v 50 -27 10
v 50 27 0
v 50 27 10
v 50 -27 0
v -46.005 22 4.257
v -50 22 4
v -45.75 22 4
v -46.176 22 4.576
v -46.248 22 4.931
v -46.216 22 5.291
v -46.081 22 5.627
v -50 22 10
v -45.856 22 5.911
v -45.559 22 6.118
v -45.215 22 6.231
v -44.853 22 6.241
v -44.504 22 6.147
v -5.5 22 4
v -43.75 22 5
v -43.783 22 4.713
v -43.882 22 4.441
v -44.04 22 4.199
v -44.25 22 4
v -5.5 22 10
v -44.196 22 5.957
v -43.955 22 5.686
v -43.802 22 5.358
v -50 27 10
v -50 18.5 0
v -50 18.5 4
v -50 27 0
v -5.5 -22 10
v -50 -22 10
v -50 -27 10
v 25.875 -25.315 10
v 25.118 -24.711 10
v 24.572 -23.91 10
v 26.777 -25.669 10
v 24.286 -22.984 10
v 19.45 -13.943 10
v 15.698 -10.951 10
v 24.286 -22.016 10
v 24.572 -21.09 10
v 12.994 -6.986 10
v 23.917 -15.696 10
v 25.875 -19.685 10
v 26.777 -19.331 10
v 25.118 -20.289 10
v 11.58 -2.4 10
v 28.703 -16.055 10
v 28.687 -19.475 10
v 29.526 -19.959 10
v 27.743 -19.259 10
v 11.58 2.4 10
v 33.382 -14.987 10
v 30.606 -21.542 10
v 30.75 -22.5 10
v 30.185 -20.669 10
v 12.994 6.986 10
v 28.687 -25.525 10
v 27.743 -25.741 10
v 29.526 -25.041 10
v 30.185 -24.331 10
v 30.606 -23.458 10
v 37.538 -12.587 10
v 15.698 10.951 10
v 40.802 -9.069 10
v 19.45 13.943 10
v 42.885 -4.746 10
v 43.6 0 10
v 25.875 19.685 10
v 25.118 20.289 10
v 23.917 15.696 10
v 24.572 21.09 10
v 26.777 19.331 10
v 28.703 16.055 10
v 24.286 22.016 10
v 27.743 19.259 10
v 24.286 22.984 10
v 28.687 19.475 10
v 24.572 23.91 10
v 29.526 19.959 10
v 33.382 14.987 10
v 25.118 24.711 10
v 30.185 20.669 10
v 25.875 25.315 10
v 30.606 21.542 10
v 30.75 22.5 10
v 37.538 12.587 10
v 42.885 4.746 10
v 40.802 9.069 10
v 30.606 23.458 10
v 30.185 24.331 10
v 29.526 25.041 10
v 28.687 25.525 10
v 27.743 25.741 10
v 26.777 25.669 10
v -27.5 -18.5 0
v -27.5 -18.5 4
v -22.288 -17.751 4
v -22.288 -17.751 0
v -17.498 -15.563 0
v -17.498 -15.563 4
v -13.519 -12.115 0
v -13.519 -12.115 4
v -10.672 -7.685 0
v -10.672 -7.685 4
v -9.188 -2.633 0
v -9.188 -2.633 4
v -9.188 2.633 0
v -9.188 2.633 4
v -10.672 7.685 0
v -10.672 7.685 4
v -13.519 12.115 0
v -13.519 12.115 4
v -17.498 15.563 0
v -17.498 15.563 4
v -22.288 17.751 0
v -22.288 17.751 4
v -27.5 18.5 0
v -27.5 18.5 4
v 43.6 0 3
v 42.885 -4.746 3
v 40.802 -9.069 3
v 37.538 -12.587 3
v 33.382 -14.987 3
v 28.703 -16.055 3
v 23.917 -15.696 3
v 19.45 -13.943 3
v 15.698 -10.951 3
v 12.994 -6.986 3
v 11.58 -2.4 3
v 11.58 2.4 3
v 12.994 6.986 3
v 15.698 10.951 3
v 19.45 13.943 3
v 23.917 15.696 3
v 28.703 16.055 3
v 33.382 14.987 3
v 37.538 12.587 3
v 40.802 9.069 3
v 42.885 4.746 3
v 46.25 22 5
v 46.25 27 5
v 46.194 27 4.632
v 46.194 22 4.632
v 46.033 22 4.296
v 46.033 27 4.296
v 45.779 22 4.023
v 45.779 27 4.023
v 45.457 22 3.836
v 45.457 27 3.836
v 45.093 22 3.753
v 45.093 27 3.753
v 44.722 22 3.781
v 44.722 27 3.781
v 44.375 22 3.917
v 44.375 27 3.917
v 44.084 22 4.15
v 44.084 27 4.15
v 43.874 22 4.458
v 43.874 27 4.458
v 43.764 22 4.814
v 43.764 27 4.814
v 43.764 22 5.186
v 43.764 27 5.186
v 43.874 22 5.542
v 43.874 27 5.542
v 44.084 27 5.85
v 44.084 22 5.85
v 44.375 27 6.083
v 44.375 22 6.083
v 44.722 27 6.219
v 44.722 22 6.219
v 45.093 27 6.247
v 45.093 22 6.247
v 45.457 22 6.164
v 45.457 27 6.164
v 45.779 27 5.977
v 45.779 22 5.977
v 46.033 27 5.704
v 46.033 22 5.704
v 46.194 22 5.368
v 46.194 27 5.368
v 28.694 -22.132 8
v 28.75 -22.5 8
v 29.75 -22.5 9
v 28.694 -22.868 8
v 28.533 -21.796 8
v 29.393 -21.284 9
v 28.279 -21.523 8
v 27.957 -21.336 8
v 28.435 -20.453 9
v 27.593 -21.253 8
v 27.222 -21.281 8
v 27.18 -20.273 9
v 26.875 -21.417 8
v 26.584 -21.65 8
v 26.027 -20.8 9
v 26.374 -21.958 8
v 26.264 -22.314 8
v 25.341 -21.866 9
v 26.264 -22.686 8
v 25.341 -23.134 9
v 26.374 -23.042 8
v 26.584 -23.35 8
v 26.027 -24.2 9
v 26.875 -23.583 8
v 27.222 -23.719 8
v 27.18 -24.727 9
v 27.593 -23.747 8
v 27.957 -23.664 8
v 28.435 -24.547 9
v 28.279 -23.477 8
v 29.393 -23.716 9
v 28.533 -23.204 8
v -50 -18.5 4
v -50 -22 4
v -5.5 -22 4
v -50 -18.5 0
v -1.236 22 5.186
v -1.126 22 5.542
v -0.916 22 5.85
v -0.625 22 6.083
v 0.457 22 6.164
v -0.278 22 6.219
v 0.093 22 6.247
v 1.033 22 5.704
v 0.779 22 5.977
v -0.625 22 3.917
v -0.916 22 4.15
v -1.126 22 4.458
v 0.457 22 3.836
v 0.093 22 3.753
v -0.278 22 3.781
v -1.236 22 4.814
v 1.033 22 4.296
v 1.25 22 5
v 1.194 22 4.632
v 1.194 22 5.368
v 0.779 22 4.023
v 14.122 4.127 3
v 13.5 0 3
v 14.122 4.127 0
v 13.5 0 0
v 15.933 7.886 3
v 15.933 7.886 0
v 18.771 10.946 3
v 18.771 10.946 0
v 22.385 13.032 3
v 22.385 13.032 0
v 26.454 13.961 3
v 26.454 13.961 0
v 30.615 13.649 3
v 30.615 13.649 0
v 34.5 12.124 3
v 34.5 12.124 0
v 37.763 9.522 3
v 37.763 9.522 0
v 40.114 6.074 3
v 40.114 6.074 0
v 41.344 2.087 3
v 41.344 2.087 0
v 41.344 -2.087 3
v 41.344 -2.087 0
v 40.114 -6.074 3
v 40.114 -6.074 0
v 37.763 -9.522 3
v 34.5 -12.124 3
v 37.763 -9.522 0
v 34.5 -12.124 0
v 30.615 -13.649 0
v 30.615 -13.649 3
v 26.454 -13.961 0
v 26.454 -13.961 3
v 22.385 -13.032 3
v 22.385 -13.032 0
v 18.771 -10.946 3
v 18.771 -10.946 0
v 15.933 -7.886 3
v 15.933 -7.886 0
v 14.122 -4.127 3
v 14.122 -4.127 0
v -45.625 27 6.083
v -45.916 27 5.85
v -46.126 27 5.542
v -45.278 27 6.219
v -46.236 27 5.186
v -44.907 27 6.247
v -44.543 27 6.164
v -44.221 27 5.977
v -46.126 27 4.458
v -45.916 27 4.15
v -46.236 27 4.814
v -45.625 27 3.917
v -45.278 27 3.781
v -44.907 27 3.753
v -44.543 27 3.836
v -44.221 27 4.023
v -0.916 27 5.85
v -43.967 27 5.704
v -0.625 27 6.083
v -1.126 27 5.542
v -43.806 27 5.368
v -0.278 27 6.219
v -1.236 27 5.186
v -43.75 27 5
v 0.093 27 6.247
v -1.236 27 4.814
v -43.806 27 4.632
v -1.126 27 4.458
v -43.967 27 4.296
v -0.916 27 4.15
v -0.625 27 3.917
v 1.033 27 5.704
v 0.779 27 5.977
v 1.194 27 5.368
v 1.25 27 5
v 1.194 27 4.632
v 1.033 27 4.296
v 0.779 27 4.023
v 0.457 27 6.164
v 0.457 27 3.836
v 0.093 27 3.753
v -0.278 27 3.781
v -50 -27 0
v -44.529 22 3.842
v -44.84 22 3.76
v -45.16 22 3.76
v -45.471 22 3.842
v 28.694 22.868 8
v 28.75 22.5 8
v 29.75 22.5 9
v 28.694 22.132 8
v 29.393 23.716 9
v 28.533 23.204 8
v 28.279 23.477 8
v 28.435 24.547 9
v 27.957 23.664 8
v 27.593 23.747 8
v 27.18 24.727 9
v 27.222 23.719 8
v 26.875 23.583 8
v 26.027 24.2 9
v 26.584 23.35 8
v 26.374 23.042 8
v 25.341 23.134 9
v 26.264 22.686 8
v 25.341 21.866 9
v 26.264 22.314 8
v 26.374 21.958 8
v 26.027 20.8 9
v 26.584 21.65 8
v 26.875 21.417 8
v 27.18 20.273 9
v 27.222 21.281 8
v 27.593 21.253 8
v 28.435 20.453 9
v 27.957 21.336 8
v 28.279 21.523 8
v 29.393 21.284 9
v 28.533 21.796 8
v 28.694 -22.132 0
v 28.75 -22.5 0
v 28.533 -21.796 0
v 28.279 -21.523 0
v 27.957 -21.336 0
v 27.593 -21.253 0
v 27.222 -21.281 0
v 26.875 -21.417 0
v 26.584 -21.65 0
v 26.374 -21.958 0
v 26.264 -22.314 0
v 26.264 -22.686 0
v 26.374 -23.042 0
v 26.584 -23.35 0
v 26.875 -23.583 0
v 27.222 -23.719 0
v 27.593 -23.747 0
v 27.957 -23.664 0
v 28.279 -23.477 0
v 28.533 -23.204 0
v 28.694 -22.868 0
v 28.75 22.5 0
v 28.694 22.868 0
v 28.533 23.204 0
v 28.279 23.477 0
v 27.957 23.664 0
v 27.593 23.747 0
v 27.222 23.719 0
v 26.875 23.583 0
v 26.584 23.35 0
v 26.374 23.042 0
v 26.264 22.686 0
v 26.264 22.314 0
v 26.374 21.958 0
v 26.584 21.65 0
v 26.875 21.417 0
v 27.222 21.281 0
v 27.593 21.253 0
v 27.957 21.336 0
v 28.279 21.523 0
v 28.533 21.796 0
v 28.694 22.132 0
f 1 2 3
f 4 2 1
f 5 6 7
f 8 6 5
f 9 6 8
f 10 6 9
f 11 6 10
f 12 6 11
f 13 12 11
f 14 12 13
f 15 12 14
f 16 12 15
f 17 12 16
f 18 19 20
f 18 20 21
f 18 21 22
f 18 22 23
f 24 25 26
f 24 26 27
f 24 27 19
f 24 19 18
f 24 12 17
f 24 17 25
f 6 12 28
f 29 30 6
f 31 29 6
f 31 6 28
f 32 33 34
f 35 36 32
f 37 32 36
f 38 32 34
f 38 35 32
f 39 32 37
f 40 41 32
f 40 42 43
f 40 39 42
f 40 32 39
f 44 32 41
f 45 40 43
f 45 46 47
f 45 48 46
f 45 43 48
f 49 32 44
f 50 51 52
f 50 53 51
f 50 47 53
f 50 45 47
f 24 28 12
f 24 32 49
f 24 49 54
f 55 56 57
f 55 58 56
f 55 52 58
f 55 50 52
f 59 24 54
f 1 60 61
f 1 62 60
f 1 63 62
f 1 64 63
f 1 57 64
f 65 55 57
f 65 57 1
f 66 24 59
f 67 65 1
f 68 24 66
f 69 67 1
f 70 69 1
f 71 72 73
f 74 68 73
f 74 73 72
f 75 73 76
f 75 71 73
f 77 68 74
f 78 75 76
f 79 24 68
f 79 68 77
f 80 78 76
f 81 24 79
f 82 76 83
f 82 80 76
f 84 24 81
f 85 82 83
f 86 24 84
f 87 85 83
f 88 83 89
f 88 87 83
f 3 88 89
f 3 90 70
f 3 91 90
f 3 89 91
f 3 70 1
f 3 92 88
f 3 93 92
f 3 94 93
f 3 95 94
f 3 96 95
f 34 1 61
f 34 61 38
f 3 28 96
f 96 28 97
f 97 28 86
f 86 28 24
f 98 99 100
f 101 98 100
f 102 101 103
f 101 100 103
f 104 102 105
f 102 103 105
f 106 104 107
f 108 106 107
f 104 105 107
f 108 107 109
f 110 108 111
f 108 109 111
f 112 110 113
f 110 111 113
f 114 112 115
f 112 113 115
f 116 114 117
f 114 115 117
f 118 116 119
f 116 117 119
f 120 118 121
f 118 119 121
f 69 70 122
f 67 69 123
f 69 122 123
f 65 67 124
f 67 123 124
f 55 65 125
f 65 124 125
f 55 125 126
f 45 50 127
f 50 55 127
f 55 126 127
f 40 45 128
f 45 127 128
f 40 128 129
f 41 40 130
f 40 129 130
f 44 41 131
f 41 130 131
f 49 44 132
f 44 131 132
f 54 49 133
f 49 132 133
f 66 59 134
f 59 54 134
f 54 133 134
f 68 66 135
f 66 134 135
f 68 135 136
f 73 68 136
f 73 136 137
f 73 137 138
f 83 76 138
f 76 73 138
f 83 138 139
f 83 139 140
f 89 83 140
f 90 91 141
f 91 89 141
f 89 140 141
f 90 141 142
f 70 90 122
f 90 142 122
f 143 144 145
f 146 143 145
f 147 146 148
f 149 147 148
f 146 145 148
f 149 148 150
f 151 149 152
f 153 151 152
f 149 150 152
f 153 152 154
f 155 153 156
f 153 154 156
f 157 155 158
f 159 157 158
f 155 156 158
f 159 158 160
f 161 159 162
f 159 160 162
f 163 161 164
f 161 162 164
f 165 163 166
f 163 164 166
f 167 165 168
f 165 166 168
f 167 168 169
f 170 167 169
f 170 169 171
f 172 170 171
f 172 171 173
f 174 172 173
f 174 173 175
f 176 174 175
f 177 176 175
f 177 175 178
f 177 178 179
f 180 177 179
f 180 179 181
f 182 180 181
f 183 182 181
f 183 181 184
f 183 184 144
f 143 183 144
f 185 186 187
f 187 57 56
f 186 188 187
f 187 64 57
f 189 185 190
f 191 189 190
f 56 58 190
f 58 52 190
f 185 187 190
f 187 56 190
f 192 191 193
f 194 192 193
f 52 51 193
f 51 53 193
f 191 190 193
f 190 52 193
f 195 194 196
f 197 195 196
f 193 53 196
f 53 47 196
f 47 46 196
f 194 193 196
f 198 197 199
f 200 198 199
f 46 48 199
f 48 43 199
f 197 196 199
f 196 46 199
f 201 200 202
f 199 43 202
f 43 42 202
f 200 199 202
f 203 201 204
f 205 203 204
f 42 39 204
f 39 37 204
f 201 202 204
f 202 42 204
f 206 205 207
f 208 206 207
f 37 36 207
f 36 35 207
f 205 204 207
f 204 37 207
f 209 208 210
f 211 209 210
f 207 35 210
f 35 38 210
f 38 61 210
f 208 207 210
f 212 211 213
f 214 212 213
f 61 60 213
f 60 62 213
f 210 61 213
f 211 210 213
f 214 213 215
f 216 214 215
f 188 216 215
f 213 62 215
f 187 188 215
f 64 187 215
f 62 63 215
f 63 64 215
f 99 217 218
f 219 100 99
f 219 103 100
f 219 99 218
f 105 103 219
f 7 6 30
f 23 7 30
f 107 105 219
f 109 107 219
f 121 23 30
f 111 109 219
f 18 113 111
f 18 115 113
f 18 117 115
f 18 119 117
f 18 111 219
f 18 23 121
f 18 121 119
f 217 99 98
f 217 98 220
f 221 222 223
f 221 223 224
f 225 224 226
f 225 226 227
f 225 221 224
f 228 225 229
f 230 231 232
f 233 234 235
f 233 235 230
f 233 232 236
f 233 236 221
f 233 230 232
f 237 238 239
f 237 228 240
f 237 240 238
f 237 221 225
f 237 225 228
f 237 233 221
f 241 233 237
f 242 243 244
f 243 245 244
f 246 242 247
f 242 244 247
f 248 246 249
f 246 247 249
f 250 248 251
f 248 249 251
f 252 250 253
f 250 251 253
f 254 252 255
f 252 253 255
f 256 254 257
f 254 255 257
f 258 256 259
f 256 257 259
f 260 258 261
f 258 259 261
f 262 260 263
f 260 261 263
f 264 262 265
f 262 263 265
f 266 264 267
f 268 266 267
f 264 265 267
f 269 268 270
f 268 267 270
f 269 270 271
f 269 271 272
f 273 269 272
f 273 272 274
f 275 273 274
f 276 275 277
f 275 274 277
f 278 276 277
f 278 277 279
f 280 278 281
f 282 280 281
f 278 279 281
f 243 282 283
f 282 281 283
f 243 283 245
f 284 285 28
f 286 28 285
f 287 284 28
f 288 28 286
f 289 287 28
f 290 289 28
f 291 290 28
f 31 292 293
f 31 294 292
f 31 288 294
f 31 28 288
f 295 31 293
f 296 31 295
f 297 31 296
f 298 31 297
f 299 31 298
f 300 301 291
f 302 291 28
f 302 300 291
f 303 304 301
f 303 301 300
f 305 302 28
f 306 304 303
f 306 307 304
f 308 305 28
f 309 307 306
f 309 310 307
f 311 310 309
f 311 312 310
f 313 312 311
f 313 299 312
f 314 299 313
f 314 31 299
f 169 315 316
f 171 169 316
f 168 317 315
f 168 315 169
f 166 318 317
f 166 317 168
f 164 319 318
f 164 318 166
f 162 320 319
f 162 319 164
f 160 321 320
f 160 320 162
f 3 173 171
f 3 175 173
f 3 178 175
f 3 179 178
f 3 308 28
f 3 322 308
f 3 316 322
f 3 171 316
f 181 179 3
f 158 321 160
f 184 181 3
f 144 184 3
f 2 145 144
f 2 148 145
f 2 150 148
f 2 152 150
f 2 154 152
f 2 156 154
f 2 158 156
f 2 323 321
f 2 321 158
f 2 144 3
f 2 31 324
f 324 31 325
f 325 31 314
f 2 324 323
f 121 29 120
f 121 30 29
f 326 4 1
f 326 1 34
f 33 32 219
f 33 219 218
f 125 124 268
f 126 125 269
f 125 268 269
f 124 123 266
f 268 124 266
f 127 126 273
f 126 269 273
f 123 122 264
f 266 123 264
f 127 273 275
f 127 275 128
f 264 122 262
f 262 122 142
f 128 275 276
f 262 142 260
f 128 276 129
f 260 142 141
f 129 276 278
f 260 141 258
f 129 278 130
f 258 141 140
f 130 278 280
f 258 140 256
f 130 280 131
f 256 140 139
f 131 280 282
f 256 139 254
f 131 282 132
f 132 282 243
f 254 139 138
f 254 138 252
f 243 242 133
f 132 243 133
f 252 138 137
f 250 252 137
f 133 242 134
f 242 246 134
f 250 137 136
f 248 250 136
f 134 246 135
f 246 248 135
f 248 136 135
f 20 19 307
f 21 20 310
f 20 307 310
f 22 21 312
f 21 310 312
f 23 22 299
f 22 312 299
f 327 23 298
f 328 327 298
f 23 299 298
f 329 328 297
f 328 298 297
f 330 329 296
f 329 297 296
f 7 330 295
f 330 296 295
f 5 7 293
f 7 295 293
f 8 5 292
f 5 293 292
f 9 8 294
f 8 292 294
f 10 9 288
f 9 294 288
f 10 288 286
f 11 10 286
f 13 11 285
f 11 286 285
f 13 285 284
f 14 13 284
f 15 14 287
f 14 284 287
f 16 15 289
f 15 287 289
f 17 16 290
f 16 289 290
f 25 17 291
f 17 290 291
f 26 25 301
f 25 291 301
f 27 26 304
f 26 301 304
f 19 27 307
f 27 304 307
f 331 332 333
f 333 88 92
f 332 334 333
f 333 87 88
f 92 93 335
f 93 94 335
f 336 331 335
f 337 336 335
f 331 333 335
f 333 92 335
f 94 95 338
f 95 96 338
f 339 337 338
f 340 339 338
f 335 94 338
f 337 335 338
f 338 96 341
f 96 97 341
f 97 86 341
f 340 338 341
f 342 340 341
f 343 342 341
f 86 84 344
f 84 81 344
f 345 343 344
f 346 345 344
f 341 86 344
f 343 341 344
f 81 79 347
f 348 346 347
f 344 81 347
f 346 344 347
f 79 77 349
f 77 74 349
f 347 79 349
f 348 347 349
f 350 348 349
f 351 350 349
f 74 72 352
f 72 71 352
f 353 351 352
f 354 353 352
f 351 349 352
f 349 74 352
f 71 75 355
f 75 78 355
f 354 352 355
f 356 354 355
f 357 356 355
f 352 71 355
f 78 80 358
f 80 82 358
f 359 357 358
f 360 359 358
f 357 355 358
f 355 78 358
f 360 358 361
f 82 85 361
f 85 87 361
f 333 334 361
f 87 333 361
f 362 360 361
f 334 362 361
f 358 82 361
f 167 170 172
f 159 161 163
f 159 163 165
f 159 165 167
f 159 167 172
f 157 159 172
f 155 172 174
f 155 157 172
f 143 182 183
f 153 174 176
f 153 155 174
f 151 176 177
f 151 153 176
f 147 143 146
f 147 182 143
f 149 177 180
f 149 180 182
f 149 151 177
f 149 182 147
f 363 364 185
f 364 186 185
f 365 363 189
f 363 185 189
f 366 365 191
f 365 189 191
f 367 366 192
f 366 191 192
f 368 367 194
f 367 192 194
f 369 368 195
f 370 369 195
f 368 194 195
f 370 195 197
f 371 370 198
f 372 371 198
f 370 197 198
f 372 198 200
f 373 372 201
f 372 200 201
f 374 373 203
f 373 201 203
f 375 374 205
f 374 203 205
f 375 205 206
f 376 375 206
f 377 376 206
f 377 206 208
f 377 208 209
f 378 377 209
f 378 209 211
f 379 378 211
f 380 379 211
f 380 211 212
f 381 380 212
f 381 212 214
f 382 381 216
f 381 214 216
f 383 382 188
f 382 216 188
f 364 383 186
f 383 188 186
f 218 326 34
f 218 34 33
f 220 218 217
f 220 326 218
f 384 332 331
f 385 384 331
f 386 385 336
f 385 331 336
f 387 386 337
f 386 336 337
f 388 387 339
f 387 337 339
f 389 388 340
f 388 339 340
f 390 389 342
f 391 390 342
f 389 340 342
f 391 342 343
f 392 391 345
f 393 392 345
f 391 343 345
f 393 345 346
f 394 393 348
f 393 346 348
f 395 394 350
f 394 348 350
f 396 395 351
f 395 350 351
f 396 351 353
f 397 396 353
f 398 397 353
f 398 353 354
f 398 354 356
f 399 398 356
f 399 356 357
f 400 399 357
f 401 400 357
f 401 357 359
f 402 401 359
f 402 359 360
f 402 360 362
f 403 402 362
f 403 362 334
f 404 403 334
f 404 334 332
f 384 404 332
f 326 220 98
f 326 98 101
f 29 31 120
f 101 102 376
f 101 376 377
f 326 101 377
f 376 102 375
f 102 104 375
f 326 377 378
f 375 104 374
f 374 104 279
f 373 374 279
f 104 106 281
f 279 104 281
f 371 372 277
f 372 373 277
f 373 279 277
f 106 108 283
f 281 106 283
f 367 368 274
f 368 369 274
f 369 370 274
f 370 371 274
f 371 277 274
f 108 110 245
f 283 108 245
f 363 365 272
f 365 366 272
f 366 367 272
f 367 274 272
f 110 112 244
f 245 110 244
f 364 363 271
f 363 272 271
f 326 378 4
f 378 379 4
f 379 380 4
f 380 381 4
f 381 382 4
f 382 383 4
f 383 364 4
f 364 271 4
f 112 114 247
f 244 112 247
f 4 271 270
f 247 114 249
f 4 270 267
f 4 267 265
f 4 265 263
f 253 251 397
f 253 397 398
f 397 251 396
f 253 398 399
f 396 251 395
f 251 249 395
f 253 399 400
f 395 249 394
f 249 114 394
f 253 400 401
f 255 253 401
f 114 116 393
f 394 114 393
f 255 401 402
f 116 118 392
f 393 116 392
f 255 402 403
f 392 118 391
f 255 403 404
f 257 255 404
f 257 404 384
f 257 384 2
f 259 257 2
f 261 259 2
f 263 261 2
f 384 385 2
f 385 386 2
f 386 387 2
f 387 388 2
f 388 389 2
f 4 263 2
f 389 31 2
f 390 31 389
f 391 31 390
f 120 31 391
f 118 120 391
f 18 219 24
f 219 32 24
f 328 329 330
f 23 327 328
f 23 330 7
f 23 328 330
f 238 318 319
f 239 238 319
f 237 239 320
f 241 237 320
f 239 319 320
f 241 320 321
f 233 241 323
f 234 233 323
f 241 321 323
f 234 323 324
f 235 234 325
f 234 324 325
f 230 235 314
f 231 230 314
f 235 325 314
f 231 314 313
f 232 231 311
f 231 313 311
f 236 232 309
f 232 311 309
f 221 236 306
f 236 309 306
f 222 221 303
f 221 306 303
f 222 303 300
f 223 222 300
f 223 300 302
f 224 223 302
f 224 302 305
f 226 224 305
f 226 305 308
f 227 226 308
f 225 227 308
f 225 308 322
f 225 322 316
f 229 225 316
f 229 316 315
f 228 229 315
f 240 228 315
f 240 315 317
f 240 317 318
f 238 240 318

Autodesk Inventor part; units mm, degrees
ref_plane "YZ Plane" through (0, 0, 0) normal (1, 0, 0) x (0, 1, 0)
ref_plane "XZ Plane" through (0, 0, 0) normal (0, 1, 0) x (-1, 0, 0)
ref_plane "XY Plane" through (0, 0, 0) normal (0, 0, 1) x (1, 0, 0)
sketch "Эскиз1" plane through (0, 0, 0) normal (0, 0, 1) x (1, 0, 0)
  line L0 (50, -27) -> (-50, -27)
  line L1 (-50, -27) -> (-50, 27)
  line L2 (-50, 27) -> (50, 27)
  line L3 (50, 27) -> (50, -27)
  line L4 (50, -27) -> (-50, 27) construction
  line L5 (-50, -27) -> (50, 27) construction
  circle A0 centre (27.5, 0) radius 16.1
  point P0 (0, 0)
  point P1 (0, 0)
  dimension "d0" = 100
  dimension "d1" = 54
  dimension "d2" = 32.2
  dimension "d3" = 22.5
extrude "Выдавливание1" add sketch "Эскиз1" along normal blind 10
sketch "Эскиз2" plane through (0, 0, 0) normal (0, 0, -1) x (-1, 0, 0)
  circle A0 centre (-27.5, 0) radius 16.1 projected
  circle A1 centre (-27.5, 0) radius 14
  point P0 (0, 0)
  dimension "d6" = 28
extrude "Выдавливание2" add sketch "Эскиз2" against normal blind 3
sketch "Эскиз3" plane through (0, 0, 10) normal (0, 0, 1) x (1, 0, 0)
  line L0 (-5.5, -22) -> (-5.5, 22) projected
  circle A0 centre (-27.5, 0) radius 18.5
  line L1 (-27.5, -18.5) -> (-62.6366, -18.5)
  line L2 (-62.6366, -18.5) -> (-62.6366, 18.5)
  line L3 (-62.6366, 18.5) -> (-27.5, 18.5)
  point P0 (0, 0)
  dimension "d9" = 37
  dimension "d10" = 22
extrude "Выдавливание3" cut sketch "Эскиз3" against normal blind 28.4
sketch "Эскиз4" plane through (0, 0, 10) normal (0, 0, 1) x (1, 0, 0)
  line L0 (-5.5, -22) -> (-5.5, 22) projected
  line L1 (-51.5, 22) -> (-5.5, 22)
  line L2 (-5.5, 22) -> (-5.5, -22)
  line L3 (-5.5, -22) -> (-51.5, -22)
  line L4 (-51.5, -22) -> (-51.5, 22)
  line L5 (-51.5, 22) -> (-5.5, -22) construction
  line L6 (-5.5, 22) -> (-51.5, -22) construction
  point P0 (0, 0)
  point P1 (-28.5, 0)
  dimension "d13" = 46
  dimension "d14" = 44
extrude "Выдавливание4" cut sketch "Эскиз4" against normal blind 6
sketch "Эскиз6" plane through (-50, 27, 0) normal (0, 1, 0) x (1, 0, 0)
  circle A0 centre (95, -5) radius 1.25
  circle A1 centre (50, -5) radius 1.25
  circle A2 centre (5, -5) radius 1.25
  line L0 (100, 0) -> (100, -10) projected
  line L1 (0, 0) -> (0, -10) projected
  line L2 (0, 0) -> (100, 0) projected
  point P0 (50, 0)
  point P1 (100, -5)
  point P2 (50, 0)
  dimension "d22" = 2.5
  dimension "d23" = 2.5
  dimension "d24" = 2.5
  dimension "d25" = 5
  dimension "d26" = 5
extrude "Выдавливание6" cut sketch "Эскиз6" against normal up to surface (5 mm away)
sketch "Эскиз7" plane through (0, 0, 10) normal (0, 0, 1) x (1, 0, 0)
  circle A0 centre (27.5, 22.5) radius 1.25
  circle A1 centre (27.5, -22.5) radius 1.25
  circle A2 centre (27.5, 0) radius 16.1 projected
  point P0 (27.5, 0)
  dimension "d40" = 2.5
  dimension "d41" = 2.5
  dimension "d42" = 22.5
  dimension "d43" = 22.5
extrude "Выдавливание7" cut sketch "Эскиз7" against normal blind 10 contours A0 | A1
chamfer "Фаска3" distance 2 angle 45 2 edges at (26.25, -22.5, 10) (26.25, 22.5, 10)
equation "\"d22\" = d23"
equation "\"d23\" = d24"
properties part number "крепление подшипникового блока левая часть"
